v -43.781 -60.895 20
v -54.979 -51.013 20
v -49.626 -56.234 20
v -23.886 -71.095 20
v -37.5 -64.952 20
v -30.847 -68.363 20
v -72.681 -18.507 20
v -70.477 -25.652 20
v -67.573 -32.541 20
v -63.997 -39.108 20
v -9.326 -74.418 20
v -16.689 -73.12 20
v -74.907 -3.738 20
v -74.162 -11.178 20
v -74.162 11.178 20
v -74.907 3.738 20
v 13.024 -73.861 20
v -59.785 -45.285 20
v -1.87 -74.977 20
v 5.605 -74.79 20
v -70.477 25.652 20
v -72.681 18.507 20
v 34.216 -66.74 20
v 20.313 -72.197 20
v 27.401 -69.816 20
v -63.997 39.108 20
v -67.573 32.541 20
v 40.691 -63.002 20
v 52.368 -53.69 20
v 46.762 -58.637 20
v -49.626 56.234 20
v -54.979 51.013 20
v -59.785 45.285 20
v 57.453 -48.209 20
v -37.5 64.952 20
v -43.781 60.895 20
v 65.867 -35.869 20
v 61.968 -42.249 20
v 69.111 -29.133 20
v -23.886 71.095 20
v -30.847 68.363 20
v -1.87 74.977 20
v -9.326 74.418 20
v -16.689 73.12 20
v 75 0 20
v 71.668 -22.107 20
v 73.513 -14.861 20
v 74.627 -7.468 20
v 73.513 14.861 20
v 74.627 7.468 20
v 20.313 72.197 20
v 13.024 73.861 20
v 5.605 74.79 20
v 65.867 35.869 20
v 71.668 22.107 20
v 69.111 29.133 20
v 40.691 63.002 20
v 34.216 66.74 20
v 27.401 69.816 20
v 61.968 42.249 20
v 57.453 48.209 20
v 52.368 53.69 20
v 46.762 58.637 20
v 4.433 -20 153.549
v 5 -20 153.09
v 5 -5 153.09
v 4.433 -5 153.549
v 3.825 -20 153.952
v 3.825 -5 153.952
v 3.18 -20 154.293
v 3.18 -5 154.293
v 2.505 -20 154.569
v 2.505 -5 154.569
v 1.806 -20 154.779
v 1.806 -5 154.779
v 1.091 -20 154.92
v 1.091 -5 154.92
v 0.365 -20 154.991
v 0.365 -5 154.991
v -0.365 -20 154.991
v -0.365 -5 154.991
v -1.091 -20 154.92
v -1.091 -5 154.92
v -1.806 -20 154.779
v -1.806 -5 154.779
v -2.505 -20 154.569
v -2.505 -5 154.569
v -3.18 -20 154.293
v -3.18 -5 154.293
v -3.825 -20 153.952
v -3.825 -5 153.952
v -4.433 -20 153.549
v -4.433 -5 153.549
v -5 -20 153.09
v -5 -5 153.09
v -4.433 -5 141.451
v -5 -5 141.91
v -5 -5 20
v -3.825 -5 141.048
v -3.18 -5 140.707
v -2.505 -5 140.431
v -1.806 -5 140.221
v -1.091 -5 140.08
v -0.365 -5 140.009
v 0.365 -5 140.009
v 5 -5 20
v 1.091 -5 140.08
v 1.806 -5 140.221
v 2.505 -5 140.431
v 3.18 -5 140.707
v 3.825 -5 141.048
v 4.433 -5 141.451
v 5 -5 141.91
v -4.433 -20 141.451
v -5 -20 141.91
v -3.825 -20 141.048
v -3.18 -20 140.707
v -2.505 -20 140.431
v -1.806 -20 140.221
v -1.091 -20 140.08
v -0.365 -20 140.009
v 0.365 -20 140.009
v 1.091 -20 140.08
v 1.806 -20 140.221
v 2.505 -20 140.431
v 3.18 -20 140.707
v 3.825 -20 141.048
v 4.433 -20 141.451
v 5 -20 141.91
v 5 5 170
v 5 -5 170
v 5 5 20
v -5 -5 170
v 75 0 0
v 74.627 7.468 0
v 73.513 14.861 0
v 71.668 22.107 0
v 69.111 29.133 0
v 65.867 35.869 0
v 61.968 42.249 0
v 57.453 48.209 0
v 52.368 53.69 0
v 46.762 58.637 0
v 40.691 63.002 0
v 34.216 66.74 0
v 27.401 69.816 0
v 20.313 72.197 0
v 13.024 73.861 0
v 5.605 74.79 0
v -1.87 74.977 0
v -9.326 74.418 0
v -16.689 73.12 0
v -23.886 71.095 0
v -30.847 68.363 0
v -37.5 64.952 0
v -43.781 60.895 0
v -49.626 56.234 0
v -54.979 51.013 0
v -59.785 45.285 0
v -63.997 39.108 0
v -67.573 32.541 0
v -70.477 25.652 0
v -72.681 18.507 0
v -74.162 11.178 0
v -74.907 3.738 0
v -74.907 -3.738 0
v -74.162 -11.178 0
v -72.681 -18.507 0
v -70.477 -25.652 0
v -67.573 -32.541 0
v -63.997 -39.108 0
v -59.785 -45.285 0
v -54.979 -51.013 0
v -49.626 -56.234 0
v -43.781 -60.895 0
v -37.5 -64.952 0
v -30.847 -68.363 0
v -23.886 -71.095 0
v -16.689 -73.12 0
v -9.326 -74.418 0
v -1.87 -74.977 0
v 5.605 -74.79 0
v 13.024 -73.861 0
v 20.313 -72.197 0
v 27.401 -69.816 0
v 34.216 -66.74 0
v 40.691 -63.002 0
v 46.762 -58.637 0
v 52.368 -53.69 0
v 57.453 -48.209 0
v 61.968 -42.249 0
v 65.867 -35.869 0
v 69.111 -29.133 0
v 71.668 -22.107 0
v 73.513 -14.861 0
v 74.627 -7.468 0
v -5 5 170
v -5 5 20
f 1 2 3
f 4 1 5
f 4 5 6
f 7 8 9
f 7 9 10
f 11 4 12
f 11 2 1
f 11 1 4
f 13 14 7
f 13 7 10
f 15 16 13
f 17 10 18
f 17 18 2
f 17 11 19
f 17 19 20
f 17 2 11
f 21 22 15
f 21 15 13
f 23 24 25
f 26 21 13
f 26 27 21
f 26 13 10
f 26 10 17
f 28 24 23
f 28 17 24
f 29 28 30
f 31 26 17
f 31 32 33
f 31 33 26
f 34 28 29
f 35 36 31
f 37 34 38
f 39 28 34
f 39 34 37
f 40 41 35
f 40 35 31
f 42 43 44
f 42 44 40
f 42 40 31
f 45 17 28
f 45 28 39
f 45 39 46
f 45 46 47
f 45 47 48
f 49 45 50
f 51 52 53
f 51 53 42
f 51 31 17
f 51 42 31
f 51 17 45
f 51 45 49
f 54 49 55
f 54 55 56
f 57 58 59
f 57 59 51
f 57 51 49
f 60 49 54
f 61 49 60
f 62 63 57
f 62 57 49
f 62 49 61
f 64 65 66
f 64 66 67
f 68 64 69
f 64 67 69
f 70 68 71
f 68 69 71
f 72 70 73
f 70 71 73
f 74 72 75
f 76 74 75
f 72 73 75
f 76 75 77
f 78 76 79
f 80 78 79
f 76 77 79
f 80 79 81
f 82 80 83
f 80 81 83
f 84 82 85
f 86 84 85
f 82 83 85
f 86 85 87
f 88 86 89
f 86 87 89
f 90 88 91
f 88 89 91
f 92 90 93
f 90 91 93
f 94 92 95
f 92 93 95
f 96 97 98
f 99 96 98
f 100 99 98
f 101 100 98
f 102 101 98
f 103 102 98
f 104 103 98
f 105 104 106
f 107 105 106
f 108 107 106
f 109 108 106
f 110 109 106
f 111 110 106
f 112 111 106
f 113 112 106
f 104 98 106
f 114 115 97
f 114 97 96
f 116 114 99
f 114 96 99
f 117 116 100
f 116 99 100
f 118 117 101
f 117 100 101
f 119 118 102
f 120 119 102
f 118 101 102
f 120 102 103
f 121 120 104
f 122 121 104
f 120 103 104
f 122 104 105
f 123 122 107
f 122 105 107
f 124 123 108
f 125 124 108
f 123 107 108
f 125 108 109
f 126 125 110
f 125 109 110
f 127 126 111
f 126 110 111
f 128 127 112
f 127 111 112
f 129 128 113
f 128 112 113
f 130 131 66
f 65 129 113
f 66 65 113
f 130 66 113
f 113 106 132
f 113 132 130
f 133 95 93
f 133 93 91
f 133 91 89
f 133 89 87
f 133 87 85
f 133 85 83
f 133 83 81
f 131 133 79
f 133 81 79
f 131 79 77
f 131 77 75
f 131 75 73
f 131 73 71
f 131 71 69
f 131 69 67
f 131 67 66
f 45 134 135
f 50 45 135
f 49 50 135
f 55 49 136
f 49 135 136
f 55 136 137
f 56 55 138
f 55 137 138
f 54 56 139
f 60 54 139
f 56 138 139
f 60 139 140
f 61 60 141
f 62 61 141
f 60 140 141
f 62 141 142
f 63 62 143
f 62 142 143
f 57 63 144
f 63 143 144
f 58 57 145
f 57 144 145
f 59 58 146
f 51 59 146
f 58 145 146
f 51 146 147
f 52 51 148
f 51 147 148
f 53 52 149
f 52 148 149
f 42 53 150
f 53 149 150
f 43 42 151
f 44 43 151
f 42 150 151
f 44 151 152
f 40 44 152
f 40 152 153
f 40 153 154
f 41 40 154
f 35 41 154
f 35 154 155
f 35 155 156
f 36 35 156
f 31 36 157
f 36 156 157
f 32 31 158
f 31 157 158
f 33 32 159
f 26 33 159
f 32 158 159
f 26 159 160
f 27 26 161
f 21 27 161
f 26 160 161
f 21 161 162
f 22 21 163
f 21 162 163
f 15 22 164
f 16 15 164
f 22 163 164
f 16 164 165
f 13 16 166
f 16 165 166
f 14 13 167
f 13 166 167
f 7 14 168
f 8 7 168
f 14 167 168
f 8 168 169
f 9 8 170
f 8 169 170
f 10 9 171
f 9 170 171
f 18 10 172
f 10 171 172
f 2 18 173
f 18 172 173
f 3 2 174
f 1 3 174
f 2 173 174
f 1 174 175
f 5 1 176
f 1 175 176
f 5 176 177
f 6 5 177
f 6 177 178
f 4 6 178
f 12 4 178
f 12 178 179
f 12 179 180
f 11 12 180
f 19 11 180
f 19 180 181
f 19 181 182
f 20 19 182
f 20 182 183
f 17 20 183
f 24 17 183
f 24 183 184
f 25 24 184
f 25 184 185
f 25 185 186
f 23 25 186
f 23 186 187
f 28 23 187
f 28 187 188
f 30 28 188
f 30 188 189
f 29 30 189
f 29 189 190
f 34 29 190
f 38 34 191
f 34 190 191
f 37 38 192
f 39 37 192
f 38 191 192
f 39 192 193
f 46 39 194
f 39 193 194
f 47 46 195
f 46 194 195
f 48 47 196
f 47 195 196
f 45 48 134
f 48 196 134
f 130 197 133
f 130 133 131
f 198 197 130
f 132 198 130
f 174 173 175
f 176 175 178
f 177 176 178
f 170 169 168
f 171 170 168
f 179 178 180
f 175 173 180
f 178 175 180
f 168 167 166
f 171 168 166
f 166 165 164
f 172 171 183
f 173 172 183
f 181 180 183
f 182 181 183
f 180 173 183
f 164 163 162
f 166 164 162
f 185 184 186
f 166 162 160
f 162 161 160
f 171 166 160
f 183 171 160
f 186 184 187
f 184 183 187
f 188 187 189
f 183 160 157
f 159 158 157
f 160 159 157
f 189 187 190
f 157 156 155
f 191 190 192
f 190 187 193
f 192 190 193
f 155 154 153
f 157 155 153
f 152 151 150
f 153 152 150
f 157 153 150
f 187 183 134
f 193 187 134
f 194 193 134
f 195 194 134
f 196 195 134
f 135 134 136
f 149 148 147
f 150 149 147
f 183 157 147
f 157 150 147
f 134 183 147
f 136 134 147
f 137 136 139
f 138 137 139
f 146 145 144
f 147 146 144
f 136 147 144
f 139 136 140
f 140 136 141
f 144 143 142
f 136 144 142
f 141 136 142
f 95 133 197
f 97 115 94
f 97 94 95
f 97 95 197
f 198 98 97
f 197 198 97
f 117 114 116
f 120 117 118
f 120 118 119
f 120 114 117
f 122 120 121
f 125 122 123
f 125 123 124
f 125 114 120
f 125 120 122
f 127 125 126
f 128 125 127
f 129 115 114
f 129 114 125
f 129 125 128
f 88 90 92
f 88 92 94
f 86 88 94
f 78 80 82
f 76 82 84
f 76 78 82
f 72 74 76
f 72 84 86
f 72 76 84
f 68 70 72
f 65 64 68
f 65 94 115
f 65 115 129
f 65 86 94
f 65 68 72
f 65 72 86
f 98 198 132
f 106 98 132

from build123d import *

# Parameters (mm, degrees)
F0_R     = 75
F1_DEPTH = 20
F2_W     = 10
F2_H     = 10
F3_DEPTH = 150
F5_DEPTH = 15


with BuildPart() as f1:
    # F0 (on Top) → F1 (new body)
    with BuildSketch(Plane.XY):
        Circle(F0_R)
    extrude(amount=F1_DEPTH)


with BuildPart() as f3:
    # F2 (on face) → F3 (new body)
    with BuildSketch(Plane.XY.offset(20)):
        Rectangle(F2_W, F2_H)
    extrude(amount=F3_DEPTH)

    # F4 (on face) → F5 (join)
    with BuildSketch(Plane.XZ.offset(5)):
        with BuildLine():
            Line((5, 141.9098300563), (5, 153.0901699437))
            ThreePointArc((5, 153.0901699437), (0, 155), (-5, 153.0901699437))
            Line((-5, 153.0901699437), (-5, 141.9098300563))
            ThreePointArc((-5, 141.9098300563), (0, 140), (5, 141.9098300563))
        make_face()
    extrude(amount=F5_DEPTH)


solid = Compound([f1.part, f3.part])
